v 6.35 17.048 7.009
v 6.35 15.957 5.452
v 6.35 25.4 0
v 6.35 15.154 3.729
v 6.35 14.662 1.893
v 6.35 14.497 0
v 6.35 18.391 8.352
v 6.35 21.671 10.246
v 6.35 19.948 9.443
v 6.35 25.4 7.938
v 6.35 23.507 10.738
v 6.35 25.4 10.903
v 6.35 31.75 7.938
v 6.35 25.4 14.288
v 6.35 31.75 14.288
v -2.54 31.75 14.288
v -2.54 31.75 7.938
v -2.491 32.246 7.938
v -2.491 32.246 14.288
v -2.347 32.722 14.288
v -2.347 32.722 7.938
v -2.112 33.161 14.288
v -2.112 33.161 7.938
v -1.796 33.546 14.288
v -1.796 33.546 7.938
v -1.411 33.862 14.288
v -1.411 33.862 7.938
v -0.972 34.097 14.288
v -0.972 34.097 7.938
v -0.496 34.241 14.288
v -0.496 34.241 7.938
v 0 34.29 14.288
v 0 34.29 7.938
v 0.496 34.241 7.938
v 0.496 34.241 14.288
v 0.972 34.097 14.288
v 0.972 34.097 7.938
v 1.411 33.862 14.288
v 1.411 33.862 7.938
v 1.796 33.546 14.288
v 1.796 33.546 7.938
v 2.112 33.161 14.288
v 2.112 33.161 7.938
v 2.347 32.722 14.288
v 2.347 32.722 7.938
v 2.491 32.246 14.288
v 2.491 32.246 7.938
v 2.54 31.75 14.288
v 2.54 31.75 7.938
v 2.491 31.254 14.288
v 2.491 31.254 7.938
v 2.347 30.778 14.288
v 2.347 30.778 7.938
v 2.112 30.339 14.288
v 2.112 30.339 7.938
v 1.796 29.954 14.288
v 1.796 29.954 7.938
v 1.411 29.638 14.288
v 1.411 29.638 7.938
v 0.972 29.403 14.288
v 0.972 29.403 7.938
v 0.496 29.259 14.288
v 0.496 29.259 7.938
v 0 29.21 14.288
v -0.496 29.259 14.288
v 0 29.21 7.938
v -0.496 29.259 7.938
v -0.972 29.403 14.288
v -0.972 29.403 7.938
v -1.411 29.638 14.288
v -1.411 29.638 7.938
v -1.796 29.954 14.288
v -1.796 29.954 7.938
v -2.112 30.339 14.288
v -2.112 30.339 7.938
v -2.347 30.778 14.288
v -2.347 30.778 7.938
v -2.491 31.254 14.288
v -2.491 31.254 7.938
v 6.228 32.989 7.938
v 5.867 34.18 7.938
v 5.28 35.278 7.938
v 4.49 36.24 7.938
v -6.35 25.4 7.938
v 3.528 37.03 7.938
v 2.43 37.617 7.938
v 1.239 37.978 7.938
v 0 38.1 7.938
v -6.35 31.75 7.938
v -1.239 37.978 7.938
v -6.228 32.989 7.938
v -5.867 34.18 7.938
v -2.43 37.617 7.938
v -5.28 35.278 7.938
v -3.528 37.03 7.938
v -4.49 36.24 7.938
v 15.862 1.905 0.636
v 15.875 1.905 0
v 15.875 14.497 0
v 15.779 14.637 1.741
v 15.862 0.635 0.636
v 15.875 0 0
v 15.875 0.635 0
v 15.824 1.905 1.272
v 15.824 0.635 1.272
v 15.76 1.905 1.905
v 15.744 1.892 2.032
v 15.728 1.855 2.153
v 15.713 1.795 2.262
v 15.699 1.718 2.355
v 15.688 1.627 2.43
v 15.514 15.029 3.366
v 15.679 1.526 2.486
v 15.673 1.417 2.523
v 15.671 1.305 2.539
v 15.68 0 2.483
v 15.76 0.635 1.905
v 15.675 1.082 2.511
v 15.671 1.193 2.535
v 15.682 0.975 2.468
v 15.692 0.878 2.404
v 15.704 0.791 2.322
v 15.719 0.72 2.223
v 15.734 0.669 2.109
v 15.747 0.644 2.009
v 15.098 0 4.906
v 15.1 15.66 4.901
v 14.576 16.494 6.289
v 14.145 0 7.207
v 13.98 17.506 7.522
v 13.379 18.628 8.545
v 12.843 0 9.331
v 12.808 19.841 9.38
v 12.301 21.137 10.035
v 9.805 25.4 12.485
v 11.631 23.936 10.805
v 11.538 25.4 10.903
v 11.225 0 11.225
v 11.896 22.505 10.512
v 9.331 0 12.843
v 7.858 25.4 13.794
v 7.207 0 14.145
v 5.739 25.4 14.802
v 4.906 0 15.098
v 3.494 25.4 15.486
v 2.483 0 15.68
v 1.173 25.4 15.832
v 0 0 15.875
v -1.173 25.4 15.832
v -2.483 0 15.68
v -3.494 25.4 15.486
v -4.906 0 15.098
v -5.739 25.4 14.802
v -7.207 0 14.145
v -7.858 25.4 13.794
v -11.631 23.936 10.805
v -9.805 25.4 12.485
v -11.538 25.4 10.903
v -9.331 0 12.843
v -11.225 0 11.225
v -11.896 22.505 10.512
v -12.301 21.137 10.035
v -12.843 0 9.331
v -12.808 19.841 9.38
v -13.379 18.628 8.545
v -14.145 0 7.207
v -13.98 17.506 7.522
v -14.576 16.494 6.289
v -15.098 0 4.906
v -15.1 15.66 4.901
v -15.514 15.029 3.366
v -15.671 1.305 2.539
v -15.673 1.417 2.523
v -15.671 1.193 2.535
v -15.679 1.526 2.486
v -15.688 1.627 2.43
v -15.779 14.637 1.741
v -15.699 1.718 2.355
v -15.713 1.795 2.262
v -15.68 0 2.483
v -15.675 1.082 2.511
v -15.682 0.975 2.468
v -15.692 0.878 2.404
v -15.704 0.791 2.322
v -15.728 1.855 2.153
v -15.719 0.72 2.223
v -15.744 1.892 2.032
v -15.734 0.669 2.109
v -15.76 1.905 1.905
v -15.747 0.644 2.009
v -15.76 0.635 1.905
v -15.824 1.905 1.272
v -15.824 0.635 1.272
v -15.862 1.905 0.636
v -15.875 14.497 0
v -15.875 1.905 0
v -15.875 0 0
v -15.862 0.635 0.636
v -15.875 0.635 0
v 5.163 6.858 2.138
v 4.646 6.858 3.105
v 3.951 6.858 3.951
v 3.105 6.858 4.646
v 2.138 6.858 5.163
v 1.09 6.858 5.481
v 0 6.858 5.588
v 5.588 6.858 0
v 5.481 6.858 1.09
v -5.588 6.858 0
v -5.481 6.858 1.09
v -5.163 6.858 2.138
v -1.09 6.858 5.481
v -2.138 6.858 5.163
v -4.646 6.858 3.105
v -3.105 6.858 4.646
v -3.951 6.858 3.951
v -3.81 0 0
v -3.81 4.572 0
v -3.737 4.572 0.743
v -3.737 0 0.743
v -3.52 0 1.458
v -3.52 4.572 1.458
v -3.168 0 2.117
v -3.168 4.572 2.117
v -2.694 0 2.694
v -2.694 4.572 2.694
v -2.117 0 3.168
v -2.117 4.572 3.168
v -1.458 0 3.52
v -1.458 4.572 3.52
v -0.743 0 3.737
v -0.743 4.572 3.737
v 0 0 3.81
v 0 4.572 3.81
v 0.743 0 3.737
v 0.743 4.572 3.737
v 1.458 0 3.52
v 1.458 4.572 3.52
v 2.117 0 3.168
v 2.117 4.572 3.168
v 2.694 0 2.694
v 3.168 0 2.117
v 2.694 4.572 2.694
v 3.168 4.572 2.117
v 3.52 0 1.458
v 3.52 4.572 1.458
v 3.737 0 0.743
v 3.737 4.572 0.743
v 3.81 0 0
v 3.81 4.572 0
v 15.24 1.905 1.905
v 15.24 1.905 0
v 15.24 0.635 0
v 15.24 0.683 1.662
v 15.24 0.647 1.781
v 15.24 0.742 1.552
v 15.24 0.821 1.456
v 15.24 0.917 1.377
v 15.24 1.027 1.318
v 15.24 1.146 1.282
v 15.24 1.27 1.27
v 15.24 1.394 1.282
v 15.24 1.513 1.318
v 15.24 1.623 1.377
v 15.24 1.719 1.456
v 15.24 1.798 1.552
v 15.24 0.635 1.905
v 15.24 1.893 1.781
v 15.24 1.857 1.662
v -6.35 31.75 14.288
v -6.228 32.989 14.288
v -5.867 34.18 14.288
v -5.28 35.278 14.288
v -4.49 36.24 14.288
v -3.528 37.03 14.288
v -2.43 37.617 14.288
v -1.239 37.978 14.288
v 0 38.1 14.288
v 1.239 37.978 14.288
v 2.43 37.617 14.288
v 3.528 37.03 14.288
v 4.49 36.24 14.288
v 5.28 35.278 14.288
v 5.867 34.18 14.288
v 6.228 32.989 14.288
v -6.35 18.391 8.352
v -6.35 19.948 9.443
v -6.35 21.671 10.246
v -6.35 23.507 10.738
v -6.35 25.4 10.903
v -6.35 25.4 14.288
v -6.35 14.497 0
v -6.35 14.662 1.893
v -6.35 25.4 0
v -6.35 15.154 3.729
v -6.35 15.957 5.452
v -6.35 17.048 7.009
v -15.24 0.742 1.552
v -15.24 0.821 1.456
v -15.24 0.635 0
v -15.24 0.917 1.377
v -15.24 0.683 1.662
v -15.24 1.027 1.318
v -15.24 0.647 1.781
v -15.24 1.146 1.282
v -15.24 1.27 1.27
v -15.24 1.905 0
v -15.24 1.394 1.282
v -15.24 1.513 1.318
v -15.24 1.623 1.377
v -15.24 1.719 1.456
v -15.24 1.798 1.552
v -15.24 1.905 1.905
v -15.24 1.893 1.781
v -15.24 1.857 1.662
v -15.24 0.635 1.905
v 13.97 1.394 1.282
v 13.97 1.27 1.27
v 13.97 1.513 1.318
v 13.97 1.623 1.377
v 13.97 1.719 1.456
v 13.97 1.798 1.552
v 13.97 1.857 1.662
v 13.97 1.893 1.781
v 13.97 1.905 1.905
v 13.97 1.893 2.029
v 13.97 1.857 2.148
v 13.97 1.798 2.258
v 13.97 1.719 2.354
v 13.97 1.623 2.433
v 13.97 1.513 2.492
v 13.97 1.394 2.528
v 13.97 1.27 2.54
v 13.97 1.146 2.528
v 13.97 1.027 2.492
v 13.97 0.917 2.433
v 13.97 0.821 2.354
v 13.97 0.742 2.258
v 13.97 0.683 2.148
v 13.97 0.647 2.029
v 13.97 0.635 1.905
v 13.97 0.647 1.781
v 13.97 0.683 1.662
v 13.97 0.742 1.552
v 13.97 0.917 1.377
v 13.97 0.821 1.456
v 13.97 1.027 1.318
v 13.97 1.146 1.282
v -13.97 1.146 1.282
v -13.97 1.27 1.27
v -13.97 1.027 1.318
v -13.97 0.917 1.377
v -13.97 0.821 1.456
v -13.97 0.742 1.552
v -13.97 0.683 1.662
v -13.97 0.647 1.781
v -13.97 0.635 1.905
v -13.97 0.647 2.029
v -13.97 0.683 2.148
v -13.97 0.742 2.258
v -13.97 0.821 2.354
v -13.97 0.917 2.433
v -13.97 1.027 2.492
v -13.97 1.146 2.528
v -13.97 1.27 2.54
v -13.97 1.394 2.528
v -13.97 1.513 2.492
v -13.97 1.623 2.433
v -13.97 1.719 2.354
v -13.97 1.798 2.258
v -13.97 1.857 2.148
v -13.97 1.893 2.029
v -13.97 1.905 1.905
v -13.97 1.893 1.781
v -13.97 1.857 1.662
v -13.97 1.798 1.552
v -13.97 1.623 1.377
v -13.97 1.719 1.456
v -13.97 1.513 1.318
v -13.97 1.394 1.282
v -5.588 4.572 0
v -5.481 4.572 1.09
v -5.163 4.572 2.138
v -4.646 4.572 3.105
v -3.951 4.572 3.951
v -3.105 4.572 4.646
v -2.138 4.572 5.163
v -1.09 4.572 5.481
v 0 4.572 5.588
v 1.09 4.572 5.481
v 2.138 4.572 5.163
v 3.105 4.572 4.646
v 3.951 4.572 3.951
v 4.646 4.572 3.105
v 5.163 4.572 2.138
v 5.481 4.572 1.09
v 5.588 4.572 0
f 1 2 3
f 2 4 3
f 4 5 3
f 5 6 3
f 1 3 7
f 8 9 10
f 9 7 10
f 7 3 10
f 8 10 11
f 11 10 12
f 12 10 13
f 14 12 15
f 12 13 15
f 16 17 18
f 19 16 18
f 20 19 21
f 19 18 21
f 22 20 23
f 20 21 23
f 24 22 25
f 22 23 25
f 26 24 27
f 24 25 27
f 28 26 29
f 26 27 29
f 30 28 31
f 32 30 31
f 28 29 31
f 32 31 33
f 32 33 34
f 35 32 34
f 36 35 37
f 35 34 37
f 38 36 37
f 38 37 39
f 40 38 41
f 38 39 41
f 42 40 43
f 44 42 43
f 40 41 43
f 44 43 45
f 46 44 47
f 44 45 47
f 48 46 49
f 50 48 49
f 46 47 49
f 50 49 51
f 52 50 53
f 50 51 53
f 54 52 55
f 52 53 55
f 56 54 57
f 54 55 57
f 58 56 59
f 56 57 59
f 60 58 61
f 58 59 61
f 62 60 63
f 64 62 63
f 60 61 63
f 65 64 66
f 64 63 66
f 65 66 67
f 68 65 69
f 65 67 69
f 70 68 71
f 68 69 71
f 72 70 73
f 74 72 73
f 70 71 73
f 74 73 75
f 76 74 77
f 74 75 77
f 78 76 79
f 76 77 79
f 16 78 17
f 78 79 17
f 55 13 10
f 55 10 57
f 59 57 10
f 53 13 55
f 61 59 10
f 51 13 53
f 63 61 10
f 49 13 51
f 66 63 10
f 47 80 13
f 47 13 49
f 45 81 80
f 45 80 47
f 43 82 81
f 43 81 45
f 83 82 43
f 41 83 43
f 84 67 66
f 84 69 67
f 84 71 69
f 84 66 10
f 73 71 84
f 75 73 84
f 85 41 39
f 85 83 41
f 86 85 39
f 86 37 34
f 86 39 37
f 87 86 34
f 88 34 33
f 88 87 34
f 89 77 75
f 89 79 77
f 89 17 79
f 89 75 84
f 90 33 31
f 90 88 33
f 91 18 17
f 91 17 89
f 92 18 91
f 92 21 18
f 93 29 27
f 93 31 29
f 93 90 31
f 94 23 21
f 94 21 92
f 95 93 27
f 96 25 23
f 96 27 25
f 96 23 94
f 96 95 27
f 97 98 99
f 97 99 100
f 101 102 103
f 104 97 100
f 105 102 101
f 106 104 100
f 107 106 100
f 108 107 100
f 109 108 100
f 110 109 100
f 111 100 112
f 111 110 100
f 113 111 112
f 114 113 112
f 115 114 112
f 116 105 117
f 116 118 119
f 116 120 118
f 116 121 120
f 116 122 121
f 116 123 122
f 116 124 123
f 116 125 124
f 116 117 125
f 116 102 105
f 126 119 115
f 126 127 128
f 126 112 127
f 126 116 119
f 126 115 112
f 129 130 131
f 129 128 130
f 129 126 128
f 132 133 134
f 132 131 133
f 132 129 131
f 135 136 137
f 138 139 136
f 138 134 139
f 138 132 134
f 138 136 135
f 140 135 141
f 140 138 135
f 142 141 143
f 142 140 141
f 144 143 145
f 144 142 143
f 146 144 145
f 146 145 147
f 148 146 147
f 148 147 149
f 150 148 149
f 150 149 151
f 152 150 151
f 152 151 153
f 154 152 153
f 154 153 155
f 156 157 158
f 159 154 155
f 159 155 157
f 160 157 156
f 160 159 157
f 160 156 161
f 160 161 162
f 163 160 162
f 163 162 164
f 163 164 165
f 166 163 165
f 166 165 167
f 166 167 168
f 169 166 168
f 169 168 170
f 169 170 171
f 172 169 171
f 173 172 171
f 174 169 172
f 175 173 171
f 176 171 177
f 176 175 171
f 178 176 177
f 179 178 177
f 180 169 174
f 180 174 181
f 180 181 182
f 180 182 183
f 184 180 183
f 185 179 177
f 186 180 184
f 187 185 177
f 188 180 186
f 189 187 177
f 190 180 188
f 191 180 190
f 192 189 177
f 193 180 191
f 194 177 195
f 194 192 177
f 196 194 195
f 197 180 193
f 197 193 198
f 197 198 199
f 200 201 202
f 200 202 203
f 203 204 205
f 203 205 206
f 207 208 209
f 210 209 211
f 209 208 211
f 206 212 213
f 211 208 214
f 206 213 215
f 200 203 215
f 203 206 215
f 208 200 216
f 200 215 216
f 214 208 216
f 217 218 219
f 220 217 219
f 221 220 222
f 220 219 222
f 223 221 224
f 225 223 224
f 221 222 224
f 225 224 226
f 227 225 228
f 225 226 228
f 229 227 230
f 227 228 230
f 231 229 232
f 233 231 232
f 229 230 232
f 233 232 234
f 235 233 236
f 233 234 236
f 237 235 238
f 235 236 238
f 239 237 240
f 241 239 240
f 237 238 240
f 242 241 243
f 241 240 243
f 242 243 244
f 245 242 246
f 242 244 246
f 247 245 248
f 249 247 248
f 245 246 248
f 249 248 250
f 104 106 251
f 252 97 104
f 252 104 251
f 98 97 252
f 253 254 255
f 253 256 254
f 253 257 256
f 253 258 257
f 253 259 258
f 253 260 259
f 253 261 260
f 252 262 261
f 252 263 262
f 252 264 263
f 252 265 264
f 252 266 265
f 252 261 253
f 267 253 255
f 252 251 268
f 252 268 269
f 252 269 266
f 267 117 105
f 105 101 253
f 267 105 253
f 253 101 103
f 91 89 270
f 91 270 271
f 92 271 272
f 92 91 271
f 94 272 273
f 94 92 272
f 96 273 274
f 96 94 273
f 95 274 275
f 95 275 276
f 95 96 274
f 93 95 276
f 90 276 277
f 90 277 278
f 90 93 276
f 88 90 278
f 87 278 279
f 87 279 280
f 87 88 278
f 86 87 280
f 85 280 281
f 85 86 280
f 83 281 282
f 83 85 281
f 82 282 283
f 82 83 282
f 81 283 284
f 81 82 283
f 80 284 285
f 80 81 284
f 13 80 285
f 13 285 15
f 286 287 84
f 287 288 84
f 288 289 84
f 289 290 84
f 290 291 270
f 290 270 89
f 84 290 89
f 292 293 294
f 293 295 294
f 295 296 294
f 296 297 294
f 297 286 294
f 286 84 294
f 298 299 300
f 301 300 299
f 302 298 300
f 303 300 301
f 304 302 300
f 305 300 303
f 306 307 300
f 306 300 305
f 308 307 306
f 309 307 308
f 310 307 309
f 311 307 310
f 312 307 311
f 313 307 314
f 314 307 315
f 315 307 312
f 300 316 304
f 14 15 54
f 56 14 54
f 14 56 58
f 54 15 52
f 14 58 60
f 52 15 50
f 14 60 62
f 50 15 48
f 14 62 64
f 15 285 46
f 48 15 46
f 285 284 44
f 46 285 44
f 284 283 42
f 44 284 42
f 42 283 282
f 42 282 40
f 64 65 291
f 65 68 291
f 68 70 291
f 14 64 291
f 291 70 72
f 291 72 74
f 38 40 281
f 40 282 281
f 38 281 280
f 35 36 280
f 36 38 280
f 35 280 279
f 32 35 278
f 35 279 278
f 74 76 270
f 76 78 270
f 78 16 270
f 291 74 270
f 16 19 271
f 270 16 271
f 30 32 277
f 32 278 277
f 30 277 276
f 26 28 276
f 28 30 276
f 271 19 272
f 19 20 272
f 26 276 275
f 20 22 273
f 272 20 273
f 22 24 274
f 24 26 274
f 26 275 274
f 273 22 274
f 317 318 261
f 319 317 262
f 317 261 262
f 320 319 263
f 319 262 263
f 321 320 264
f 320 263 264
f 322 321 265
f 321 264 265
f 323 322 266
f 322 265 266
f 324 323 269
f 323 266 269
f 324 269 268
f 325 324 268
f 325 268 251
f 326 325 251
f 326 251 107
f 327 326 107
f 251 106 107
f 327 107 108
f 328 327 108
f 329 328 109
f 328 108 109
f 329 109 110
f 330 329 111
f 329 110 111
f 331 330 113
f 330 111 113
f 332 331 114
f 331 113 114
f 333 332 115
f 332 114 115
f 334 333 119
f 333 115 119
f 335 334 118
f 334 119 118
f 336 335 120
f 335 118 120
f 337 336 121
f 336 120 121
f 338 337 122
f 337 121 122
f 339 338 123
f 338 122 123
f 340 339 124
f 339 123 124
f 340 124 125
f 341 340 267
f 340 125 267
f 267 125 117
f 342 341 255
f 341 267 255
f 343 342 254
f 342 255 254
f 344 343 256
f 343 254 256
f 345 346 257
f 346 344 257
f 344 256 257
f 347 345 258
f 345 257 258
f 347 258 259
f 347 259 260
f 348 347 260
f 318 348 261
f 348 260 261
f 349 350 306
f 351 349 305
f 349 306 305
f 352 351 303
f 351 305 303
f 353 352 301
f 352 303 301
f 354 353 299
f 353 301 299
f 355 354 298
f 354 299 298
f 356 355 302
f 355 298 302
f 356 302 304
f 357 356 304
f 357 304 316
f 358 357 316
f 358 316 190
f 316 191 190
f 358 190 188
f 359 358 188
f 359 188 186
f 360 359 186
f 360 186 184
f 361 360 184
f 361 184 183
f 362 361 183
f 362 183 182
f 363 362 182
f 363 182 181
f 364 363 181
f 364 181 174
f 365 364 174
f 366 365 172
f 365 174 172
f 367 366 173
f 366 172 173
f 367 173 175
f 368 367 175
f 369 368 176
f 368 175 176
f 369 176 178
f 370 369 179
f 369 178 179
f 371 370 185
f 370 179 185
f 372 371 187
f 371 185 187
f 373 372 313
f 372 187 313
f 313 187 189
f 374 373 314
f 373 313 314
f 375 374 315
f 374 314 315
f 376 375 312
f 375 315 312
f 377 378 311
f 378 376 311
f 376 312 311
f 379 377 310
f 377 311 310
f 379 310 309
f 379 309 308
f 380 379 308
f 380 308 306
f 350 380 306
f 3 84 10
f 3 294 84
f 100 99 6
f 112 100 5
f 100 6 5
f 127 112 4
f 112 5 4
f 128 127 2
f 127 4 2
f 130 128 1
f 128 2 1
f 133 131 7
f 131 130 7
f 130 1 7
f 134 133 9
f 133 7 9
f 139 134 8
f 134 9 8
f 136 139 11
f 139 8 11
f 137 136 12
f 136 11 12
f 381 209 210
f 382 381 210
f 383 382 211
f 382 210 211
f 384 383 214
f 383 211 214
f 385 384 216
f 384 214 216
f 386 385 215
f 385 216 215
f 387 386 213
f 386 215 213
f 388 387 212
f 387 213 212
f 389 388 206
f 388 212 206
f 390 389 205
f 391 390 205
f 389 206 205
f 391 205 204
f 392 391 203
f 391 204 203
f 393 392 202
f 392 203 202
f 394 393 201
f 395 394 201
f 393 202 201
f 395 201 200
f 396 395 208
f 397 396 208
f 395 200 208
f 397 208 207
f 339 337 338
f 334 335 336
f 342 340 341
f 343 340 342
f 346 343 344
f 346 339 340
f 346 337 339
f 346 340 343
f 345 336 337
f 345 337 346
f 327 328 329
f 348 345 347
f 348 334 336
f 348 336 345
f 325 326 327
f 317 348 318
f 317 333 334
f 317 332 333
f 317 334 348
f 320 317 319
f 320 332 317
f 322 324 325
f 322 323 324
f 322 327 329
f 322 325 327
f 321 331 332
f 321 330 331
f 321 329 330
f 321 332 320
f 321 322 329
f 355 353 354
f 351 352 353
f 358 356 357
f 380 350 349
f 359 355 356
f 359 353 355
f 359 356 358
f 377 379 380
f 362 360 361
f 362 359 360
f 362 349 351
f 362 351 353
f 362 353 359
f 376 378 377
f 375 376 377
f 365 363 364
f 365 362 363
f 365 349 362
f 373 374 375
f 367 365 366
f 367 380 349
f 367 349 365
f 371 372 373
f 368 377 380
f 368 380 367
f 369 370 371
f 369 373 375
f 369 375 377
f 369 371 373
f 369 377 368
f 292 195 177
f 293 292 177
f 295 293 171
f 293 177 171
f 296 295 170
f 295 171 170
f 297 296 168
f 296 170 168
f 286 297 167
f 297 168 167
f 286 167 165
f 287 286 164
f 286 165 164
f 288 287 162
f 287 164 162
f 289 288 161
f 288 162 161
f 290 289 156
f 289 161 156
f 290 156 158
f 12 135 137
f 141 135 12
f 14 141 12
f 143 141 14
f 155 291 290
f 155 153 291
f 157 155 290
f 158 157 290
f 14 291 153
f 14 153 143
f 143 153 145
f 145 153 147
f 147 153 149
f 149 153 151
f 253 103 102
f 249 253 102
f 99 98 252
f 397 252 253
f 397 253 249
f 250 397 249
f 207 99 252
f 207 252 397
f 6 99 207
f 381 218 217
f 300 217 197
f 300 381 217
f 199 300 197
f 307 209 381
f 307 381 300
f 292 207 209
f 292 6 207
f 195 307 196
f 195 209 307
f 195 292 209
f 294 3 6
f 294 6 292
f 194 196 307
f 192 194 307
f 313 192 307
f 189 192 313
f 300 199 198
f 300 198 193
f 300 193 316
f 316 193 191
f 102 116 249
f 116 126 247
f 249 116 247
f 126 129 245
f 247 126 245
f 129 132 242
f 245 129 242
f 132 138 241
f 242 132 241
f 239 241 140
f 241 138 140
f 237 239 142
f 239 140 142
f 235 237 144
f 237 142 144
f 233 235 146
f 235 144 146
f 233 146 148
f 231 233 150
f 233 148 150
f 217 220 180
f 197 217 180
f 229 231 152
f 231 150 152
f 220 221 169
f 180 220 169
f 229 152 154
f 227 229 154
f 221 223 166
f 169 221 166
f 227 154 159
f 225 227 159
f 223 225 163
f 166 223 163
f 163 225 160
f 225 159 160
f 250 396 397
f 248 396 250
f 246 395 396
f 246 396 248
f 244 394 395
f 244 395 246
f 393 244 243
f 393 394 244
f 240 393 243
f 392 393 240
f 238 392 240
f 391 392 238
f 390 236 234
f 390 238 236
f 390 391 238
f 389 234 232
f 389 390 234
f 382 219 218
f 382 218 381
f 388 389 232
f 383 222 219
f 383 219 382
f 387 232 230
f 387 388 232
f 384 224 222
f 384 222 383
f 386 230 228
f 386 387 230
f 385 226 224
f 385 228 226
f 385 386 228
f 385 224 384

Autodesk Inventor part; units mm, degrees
ref_plane "YZ Plane" through (0, 0, 0) normal (1, 0, 0) x (0, 1, 0)
ref_plane "XZ Plane" through (0, 0, 0) normal (0, 1, 0) x (-1, 0, 0)
ref_plane "XY Plane" through (0, 0, 0) normal (0, 0, 1) x (1, 0, 0)
sketch "Sketch1" plane through (0, 0, 0) normal (0, 1, 0) x (-1, 0, 0)
  arc A0 (15.875, 0) -> (-15.875, 0) centre (0, 0) ccw
  line L0 (15.875, 0) -> (-15.875, 0)
  dimension "d3" = 31.75
extrude "Extrusion1" add sketch "Sketch1" along normal blind 25.4
sketch "Sketch2" plane through (15.875, 0, 0) normal (0, 0, -1) x (-1, 0, 0)
  line L0 (19.685, 0) -> (19.685, 4.572)
  line L1 (19.685, 4.572) -> (21.463, 4.572)
  line L2 (21.463, 4.572) -> (21.463, 6.858)
  line L3 (15.875, 0) -> (15.875, 6.858)
  line L4 (21.463, 6.858) -> (15.875, 6.858)
  line L5 (19.685, 0) -> (15.875, 0)
  line L6 (31.75, 0) -> (0, 0) projected
  dimension "d12" = 1.778
revolve "Revolution1" cut sketch "Sketch2" angle 360 about axis through (0, 0, 0) along (0, 1, 0)
sketch "Sketch3" plane through (0, 0, 0) normal (1, 0, 0) x (0, 1, 0)
  line L0 (25.4, 0) -> (25.4, 15.875) projected
  circle A0 centre (25.4, 0) radius 10.9033
  point P0 (0, 0)
extrude "Extrusion2" cut sketch "Sketch3" along normal mid plane 2540
sketch "Sketch4" plane through (0, 25.4, 0) normal (0, 1, 0) x (1, 0, 0)
  line L0 (13.7482, -7.9375) -> (-13.7482, -7.9375) projected
  line L1 (0, -7.9375) -> (-6.35, -7.9375)
  line L2 (-6.35, -7.9375) -> (-6.35, -14.2875)
  line L3 (-6.35, -14.2875) -> (6.35, -14.2875)
  line L4 (6.35, -14.2875) -> (6.35, -7.9375)
  line L5 (0, -7.9375) -> (6.35, -7.9375)
  line L6 (-6.35, -7.9375) -> (-6.35, 0)
  line L7 (-3.81, 0) -> (-15.875, 0) projected
  line L8 (-6.35, 0) -> (6.35, 0)
  line L9 (6.35, 0) -> (6.35, -7.9375)
  point P0 (0, 0)
  dimension "d17" = 6.35
  dimension "d18" = 6.35
  dimension "d19" = 12.7
extrude "Extrusion3" add sketch "Sketch4" against normal blind 12.7 contours L0 L6 L7 L8 L9
extrude "Extrusion4" add sketch "Sketch4" along normal blind 2.54 contours L4 L3 L2 L0
sketch "Sketch7" plane through (6.35, 25.4, 7.9375) normal (0, 0, -1) x (-1, 0, 0)
  line L0 (12.7, 0) -> (12.7, 2.54) projected
  line L1 (0, 0) -> (12.7, 0) projected
  arc A0 (12.7, 6.35) -> (0, 6.35) centre (6.35, 6.35) ccw
  circle A1 centre (6.35, 6.35) radius 2.54
  line L2 (12.7, 6.35) -> (12.7, 2.54)
  line L3 (12.7, 2.54) -> (0, 2.54)
  line L4 (0, 2.54) -> (0, 6.35)
  point P0 (6.35, -25.4)
  dimension "d31" = 5.08
extrude "Extrusion6" add sketch "Sketch7" against normal blind 6.35
ref_plane "Work Plane1" through (16.51, 17.4625, 0) normal (1, 0, 0) x (0, 0, -1)
sketch "Sketch10" plane through (16.51, 17.4625, 0) normal (1, 0, 0) x (0, 0, -1)
  arc A0 (-1.905, -15.5575) -> (-1.905, -16.8275) centre (-1.905, -16.1925) ccw
  line L0 (-1.905, -15.5575) -> (0, -15.5575)
  line L1 (0, -15.5575) -> (0, -16.8275)
  line L2 (-1.905, -16.8275) -> (0, -16.8275)
  circle A1 centre (-1.905, -16.1925) radius 0.635
extrude "Extrusion7" cut sketch "Sketch10" against normal blind 1.27
extrude "Extrusion8" cut sketch "Sketch10" against normal blind 2.54 contours A1 A0
mirror "Mirror1" about plane through (0, 0, 0) normal (1, 0, 0) of "Extrusion7", "Extrusion8"
sketch "Sketch14" plane through (15.875, 0, 0) normal (0, 0, -1) x (-1, 0, 0)
  line L0 (9.525, 14.4967) -> (9.525, 17.9248) projected
  line L1 (31.75, 14.4967) -> (22.225, 14.4967) projected
  line L2 (9.525, 14.4967) -> (22.225, 14.4967)
  line L3 (22.225, 25.4) -> (22.225, 17.9248) projected
  line L4 (22.225, 14.4967) -> (22.225, 25.4)
  line L5 (9.525, 25.4) -> (22.225, 25.4) projected
  line L6 (22.225, 25.4) -> (9.525, 25.4)
  line L7 (9.525, 25.4) -> (9.525, 14.4967)
  point P0 (15.875, 0)
extrude "Extrusion9" add sketch "Sketch14" against normal blind 12.7
properties part number "GERMI01-04-01"
